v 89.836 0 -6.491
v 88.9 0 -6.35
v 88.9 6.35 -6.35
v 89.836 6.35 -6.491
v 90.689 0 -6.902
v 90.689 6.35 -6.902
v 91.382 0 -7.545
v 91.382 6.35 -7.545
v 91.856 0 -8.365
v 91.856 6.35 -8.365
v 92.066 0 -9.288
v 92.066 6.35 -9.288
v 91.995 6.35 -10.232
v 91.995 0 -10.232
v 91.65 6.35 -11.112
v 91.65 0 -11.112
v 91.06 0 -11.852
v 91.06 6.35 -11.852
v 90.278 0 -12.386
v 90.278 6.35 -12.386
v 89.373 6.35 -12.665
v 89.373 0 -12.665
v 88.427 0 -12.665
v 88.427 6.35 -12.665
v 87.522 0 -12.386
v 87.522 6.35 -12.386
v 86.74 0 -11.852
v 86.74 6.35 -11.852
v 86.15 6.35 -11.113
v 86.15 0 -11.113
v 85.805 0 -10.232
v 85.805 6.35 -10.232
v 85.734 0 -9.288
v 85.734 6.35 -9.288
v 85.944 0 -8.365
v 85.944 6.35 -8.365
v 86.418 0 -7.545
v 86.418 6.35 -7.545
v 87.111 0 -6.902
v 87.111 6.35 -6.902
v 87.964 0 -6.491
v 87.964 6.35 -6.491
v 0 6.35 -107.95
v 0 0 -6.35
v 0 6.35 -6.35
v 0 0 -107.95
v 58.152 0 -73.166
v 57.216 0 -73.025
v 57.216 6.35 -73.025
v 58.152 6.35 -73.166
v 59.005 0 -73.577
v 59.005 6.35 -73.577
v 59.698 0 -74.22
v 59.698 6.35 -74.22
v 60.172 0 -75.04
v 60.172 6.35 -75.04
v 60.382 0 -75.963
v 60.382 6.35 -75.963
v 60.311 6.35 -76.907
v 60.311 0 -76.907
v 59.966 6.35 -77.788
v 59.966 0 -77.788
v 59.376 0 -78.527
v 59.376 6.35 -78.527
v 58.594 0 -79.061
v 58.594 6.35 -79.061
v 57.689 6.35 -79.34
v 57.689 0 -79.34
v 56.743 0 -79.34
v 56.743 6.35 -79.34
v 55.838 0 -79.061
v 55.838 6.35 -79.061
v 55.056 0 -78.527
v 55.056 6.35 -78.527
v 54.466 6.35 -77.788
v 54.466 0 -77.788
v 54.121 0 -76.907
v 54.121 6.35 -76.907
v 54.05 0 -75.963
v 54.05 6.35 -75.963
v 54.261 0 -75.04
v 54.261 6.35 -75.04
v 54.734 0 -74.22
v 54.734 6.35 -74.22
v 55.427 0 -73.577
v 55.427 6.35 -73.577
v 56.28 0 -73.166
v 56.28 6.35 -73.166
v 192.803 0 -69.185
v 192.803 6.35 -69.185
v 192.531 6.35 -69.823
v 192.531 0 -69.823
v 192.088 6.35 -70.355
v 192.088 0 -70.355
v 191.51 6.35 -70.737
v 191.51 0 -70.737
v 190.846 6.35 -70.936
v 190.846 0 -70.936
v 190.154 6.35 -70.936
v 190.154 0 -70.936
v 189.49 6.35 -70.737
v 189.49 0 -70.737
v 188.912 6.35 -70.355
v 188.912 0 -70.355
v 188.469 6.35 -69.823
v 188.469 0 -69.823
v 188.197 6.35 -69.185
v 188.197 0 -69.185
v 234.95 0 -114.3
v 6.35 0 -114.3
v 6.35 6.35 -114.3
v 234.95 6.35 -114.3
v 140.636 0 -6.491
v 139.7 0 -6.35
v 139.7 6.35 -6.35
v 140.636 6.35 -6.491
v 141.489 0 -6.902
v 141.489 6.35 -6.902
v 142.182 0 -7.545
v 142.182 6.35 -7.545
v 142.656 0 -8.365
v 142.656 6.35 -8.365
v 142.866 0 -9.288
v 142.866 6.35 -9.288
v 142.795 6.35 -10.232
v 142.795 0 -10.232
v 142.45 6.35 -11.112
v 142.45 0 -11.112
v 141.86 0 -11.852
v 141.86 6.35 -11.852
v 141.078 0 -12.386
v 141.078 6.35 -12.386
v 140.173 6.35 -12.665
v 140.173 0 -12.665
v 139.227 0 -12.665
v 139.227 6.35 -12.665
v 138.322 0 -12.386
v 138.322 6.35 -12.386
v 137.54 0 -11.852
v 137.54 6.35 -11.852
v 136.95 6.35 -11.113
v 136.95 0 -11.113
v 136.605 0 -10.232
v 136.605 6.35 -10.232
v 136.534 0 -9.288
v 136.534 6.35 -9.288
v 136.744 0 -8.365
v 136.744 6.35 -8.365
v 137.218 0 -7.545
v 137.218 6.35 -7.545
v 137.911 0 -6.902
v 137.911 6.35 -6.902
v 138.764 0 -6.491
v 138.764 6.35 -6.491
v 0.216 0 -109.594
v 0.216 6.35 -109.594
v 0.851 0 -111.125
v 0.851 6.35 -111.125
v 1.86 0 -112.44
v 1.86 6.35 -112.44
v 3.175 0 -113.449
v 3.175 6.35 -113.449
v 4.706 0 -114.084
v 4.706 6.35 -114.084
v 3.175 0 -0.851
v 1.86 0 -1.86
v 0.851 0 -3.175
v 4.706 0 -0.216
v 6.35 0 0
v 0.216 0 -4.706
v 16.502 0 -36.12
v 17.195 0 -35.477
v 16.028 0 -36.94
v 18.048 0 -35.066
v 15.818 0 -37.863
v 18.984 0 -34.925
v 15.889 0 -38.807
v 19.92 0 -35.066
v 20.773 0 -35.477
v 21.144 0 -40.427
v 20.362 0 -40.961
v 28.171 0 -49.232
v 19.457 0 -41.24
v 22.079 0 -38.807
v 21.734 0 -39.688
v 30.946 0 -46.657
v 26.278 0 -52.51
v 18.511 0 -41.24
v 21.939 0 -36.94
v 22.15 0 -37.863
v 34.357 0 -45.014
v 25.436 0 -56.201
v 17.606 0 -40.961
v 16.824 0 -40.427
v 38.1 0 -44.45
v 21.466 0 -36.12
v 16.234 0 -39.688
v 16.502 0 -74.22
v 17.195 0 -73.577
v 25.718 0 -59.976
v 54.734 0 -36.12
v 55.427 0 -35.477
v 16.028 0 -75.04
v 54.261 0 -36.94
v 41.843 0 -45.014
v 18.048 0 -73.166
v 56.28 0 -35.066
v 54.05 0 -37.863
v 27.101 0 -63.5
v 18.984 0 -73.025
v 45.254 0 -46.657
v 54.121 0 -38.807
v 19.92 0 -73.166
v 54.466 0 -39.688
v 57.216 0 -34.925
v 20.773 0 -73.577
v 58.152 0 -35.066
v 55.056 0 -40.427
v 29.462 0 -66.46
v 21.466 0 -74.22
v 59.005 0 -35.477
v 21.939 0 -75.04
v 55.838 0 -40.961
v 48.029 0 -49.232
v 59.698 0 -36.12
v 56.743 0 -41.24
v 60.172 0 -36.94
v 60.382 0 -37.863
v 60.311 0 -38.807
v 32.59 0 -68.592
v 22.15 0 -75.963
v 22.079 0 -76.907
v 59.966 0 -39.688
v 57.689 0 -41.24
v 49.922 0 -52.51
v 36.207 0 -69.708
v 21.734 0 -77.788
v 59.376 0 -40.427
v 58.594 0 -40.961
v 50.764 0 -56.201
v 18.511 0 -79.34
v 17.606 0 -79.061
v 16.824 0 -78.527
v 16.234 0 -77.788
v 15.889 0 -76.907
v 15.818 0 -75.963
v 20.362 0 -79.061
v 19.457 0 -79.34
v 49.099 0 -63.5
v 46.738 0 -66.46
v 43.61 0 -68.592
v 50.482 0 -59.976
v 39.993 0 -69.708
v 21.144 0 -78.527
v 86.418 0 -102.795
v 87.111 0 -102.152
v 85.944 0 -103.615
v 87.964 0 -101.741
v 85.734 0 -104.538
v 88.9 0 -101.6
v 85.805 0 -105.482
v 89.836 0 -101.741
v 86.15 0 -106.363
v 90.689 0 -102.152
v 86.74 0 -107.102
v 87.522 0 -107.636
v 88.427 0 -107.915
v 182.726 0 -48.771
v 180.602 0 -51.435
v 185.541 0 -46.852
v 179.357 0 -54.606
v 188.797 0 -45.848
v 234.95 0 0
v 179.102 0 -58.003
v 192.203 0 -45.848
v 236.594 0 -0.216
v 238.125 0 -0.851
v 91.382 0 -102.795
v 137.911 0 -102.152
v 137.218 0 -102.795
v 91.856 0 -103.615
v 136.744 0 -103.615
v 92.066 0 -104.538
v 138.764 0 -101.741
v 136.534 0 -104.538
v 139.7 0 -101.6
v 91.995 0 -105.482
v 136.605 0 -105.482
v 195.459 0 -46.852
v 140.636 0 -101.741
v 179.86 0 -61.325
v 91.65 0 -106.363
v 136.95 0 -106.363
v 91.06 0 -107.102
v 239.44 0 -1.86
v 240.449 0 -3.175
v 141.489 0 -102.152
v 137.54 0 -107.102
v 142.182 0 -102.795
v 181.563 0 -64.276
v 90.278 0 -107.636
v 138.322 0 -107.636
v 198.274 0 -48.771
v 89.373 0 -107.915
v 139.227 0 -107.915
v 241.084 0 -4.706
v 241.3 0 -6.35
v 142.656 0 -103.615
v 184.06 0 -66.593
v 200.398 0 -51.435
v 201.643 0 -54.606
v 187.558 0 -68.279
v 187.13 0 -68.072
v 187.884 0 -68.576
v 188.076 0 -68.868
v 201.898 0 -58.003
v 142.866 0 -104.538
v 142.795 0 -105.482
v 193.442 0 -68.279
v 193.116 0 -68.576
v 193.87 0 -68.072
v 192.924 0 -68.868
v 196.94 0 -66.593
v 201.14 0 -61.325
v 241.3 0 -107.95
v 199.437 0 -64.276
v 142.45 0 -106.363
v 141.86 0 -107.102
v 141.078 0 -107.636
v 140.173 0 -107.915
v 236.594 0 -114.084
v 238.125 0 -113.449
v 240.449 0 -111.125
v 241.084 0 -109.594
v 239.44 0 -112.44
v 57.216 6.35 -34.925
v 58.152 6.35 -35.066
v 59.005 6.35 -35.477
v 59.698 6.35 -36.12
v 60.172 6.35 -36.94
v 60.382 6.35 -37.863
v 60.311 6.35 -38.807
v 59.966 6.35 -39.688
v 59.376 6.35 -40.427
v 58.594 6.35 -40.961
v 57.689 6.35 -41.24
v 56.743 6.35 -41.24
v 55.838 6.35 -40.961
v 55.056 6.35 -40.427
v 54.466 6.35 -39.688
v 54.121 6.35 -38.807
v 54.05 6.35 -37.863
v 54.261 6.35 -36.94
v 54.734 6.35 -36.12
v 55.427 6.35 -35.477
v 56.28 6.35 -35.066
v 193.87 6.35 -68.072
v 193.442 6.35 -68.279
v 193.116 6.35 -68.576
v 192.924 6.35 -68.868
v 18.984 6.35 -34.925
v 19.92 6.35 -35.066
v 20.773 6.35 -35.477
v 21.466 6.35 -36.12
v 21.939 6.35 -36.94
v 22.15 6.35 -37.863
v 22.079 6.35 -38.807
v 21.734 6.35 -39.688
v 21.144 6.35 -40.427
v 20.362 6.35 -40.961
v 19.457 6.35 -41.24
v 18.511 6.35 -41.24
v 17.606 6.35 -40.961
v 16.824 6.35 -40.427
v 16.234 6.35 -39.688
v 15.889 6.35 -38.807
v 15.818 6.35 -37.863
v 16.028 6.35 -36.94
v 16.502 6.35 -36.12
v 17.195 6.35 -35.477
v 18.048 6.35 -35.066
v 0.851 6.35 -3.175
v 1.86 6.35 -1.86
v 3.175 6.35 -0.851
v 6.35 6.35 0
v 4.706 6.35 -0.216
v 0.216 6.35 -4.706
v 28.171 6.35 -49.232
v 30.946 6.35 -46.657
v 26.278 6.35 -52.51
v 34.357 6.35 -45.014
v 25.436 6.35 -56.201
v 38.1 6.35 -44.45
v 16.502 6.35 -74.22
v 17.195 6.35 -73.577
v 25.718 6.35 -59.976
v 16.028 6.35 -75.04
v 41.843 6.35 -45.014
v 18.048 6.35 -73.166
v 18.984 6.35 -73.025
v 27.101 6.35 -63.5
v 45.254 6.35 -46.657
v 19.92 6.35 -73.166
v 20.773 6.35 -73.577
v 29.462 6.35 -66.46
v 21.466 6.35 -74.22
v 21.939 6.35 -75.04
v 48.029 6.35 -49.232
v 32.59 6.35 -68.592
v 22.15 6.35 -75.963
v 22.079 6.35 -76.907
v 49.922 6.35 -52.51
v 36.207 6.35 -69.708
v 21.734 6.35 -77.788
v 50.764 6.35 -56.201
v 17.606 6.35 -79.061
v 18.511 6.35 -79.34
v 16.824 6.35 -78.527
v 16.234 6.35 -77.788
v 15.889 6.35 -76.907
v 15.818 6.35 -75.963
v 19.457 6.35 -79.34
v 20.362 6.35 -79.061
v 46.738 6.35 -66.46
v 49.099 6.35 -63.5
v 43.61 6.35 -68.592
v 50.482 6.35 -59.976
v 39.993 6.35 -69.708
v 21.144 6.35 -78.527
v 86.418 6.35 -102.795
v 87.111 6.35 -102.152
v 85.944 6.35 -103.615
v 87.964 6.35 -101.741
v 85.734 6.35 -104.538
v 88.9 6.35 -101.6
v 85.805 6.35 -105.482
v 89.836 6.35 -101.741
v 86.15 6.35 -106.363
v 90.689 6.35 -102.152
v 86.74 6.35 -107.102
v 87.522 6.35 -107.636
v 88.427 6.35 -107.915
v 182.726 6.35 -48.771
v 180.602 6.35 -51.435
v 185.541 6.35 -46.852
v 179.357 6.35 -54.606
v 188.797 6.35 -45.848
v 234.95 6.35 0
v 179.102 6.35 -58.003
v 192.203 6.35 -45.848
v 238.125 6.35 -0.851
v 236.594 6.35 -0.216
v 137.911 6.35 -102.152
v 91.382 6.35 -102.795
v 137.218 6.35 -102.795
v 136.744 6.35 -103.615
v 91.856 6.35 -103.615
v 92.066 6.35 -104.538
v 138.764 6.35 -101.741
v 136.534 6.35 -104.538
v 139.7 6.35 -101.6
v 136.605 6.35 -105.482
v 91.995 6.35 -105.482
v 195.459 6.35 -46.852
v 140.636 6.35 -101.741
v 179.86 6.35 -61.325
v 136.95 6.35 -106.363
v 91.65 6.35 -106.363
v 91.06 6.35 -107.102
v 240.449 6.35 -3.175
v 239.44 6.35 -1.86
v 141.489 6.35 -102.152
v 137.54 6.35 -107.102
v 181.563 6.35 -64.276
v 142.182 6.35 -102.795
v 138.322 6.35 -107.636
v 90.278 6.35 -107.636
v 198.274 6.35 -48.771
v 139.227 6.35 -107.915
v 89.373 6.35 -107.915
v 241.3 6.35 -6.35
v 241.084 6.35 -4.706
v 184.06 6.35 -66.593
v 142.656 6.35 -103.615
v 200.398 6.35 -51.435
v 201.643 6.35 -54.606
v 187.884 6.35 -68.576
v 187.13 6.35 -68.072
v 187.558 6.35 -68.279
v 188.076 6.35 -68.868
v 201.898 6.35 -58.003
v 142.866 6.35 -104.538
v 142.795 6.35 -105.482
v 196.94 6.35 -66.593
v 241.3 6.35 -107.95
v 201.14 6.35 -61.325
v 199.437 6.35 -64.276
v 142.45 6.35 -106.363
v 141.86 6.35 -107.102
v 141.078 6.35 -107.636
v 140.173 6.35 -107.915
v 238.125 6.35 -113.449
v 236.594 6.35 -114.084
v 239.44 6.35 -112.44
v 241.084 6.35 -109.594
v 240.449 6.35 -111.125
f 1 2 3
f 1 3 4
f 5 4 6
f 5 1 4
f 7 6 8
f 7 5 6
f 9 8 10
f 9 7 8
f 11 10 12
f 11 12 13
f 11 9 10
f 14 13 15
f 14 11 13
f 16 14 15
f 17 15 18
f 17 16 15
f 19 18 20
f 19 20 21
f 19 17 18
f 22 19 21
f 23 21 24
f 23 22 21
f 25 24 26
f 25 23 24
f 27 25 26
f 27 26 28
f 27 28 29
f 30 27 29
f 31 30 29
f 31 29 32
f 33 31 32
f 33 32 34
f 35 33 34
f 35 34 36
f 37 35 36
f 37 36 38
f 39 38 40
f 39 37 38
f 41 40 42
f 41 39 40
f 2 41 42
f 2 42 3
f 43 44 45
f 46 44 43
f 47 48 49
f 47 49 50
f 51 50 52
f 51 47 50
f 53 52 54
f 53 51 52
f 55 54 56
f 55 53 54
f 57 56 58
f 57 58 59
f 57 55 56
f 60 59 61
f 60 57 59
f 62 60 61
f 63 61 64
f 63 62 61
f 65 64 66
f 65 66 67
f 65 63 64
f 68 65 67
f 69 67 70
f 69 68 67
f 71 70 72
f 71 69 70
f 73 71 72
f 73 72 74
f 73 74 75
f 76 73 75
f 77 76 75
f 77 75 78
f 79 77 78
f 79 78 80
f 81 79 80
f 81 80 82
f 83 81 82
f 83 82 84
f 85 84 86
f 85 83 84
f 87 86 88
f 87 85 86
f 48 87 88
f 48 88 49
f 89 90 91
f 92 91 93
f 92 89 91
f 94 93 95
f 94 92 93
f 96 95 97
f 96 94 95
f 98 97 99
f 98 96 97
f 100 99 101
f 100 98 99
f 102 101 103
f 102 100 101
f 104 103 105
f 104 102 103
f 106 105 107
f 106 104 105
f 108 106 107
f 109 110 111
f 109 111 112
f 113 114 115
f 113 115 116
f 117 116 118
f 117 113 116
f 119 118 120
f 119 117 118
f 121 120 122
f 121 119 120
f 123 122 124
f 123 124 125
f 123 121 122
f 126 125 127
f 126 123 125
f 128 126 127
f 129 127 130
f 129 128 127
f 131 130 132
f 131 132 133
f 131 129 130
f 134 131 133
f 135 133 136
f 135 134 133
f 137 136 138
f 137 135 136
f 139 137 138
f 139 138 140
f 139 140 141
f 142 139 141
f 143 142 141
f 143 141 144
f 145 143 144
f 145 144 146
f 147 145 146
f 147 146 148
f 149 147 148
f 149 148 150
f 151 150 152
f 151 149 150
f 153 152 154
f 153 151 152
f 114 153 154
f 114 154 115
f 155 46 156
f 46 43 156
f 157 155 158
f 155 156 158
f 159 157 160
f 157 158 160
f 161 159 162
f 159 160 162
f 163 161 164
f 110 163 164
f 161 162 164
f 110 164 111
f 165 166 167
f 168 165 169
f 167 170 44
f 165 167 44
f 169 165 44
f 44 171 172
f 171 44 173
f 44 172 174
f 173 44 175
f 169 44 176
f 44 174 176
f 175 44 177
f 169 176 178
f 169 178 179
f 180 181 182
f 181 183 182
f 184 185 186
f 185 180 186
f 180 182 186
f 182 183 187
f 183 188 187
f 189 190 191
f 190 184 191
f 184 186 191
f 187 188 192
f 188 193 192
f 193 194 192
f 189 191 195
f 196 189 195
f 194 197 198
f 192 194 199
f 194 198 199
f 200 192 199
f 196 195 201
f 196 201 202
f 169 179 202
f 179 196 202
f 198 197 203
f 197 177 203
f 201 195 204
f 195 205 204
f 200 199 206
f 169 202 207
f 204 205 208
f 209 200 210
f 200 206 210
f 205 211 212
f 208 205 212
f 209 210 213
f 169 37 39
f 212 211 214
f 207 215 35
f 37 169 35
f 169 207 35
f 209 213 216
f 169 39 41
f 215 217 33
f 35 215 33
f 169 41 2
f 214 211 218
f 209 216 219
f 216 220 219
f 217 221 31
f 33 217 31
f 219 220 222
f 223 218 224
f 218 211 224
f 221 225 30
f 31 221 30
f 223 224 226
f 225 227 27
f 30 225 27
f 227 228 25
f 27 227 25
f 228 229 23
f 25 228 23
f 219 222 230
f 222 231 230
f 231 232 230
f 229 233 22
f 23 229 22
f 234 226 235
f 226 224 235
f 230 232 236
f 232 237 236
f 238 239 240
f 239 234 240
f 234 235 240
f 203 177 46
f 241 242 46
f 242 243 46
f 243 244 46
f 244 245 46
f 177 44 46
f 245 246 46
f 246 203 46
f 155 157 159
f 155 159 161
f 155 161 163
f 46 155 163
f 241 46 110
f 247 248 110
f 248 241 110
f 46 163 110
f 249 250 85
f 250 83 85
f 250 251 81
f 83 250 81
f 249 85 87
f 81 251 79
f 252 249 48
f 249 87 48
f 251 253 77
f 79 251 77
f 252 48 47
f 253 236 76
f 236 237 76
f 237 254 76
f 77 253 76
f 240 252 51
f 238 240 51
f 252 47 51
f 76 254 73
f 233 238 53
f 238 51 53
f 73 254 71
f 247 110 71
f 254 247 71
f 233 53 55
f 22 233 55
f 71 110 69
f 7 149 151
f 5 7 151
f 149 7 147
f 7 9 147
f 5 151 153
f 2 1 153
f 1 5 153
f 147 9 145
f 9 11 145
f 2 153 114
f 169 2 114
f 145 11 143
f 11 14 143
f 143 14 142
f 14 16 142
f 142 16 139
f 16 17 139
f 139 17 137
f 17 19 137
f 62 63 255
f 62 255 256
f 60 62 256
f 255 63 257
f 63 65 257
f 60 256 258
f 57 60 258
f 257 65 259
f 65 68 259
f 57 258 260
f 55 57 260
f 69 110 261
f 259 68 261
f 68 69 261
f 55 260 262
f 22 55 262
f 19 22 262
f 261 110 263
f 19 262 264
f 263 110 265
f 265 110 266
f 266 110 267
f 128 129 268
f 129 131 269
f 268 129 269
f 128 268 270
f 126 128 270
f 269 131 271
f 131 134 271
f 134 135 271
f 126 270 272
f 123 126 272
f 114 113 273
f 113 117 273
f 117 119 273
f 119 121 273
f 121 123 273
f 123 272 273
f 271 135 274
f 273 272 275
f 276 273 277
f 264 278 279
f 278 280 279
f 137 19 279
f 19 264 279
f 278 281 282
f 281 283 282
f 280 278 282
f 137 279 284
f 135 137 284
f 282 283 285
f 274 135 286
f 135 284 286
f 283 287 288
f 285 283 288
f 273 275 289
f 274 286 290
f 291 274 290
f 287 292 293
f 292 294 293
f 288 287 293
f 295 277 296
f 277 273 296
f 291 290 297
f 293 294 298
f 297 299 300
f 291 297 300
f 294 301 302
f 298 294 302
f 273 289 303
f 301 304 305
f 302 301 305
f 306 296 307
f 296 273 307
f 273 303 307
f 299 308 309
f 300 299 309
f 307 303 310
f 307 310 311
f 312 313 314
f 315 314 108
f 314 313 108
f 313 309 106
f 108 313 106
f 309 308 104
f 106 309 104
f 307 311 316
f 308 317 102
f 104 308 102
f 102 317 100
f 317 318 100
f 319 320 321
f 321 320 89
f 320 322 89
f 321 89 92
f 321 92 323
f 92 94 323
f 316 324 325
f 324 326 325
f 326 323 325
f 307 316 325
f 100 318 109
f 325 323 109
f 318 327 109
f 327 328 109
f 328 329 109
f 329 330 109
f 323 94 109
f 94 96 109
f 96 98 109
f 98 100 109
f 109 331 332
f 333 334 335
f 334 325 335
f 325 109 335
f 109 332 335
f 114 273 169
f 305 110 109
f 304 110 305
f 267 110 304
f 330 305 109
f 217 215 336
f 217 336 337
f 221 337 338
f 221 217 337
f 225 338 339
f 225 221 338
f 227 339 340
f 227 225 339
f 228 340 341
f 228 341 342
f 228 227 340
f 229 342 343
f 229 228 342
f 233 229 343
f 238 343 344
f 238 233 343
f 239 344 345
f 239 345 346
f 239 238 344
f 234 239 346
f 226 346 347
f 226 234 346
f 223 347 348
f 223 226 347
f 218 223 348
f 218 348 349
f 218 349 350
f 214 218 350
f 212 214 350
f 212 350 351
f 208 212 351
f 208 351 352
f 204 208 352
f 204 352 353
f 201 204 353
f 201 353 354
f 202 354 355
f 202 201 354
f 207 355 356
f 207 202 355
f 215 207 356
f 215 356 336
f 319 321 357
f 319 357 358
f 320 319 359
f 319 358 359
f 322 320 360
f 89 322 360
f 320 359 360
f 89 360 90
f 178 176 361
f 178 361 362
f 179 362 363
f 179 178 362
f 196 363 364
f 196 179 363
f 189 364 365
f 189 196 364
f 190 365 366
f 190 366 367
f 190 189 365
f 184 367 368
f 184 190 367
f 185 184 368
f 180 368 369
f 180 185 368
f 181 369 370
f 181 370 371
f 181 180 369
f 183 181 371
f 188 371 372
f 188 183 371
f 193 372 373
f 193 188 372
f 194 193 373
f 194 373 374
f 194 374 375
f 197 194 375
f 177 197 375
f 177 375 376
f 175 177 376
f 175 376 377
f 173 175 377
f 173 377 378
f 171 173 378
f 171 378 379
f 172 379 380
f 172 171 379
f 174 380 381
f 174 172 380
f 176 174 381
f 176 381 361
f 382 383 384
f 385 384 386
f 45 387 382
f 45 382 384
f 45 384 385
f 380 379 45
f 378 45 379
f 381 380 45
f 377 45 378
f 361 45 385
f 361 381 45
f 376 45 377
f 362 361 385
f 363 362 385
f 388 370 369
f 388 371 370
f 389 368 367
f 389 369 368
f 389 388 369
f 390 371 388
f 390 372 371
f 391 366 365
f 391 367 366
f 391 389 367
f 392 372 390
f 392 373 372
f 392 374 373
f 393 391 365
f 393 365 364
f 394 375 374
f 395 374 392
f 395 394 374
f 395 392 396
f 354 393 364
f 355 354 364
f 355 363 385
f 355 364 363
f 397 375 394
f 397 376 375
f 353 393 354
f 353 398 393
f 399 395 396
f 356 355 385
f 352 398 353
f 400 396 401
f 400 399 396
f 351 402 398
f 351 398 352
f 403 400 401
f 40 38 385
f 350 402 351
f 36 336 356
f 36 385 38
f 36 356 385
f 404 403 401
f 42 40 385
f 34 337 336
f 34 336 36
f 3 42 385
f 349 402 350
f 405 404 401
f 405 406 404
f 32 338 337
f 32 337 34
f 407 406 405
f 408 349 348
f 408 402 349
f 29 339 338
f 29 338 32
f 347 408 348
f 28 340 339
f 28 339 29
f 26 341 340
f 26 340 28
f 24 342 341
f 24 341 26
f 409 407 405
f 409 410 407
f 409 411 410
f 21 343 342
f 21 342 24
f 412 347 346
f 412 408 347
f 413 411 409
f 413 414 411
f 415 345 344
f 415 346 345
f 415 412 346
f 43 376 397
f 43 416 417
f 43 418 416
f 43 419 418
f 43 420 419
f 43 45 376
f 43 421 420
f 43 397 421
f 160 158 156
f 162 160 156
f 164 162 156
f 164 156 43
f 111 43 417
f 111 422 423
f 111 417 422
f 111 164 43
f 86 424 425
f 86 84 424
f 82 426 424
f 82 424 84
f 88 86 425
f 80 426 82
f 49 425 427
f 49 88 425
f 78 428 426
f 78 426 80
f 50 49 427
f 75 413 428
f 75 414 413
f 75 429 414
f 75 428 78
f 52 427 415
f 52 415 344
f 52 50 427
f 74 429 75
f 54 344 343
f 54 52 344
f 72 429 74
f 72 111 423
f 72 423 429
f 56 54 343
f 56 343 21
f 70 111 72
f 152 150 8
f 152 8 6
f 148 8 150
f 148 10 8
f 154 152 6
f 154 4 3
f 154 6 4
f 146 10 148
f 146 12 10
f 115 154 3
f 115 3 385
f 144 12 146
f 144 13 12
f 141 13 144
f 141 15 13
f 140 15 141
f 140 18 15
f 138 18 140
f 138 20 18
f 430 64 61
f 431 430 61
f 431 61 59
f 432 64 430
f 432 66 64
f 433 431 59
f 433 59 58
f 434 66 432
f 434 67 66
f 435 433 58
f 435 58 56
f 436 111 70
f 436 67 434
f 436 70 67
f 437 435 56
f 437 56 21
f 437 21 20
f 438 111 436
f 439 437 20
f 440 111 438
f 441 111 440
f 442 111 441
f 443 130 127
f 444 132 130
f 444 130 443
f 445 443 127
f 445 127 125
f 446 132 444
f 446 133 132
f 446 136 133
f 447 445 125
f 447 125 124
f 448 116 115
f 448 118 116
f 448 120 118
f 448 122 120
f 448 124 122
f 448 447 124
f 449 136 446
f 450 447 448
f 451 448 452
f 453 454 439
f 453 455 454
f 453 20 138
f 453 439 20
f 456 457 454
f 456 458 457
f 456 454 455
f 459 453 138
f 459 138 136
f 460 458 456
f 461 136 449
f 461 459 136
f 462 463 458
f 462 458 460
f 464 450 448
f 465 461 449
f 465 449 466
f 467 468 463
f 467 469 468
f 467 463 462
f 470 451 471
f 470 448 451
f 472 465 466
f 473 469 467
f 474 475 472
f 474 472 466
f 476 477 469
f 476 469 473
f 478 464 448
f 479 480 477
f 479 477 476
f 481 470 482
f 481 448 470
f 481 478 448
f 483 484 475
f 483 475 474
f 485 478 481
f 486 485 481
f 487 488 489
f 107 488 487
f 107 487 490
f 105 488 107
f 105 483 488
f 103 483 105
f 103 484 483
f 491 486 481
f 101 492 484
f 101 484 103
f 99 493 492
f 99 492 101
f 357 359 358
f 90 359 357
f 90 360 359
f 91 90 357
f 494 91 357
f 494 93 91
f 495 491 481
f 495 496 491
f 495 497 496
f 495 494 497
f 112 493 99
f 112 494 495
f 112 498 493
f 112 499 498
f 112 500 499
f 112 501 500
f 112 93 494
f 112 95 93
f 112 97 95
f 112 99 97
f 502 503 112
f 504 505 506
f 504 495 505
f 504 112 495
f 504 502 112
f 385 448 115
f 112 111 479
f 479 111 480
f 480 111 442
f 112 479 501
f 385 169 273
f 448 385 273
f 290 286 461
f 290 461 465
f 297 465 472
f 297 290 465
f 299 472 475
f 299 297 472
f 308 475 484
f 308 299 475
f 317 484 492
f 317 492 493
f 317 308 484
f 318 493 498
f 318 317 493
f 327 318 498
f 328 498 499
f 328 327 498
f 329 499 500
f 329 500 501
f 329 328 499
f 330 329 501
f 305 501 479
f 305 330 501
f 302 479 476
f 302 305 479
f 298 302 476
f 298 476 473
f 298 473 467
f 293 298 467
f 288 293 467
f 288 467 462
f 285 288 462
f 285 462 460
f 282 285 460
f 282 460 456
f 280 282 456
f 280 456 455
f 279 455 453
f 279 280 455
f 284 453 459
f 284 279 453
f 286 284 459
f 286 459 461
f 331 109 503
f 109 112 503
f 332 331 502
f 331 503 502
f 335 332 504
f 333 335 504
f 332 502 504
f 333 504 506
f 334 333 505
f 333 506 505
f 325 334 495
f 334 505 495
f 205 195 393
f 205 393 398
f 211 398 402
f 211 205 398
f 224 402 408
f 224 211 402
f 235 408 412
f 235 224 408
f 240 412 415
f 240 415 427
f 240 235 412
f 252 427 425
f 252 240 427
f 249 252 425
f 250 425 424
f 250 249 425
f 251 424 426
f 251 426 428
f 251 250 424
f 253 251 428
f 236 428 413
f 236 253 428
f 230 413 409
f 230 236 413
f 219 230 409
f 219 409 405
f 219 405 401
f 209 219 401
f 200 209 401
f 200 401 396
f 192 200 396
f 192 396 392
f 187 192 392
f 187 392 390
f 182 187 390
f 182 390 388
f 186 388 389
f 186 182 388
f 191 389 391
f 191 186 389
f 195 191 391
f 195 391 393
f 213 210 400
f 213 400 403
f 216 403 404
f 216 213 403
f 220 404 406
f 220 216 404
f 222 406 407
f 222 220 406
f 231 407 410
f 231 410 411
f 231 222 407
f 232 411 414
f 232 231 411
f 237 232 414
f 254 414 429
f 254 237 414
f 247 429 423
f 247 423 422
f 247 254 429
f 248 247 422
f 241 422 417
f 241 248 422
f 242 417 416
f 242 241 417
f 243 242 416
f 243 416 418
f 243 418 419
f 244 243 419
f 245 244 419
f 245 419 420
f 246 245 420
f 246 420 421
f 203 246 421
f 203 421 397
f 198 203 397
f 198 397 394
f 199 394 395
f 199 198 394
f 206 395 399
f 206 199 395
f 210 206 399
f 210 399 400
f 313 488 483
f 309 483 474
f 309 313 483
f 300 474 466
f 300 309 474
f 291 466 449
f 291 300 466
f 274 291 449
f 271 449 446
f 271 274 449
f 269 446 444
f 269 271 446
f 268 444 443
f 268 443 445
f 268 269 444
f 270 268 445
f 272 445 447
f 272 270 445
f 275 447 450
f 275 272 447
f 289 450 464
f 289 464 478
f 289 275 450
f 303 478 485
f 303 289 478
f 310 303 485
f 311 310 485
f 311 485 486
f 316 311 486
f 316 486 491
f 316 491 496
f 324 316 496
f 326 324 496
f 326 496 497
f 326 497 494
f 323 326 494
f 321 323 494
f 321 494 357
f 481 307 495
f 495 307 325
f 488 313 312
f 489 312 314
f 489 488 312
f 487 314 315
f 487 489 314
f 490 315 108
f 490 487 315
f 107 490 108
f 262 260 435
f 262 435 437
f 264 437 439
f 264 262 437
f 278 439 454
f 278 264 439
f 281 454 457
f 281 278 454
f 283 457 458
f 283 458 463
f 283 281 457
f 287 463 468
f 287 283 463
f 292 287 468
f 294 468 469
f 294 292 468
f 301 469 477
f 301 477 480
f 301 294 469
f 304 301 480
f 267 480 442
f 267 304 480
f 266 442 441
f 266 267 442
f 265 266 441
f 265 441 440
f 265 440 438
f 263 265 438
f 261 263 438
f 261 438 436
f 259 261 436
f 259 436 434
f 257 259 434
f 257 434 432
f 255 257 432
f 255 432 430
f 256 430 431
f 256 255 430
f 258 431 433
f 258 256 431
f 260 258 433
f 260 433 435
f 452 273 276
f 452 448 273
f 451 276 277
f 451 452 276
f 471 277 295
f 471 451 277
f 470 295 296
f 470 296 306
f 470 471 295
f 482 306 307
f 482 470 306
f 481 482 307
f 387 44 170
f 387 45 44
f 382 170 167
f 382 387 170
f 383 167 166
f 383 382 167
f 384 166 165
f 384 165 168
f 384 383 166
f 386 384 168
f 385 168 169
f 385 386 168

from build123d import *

# Parameters (mm, degrees)
SKETCH1_W           = 241.3
SKETCH1_H           = 114.3
SKETCH1_R           = 12.7
SKETCH1_R_2         = 3.175
BOSS_EXTRUDE1_DEPTH = 6.35
FILLET1_R           = 6.35
FILLET2_R           = 1.5875


with BuildPart() as part:
    # Sketch1 → Boss-Extrude1 (new body)
    with BuildSketch(Plane(origin=(0, 0, 0), x_dir=(1, 0, 0), z_dir=(0, 1, 0))):
        with Locations((120.65, 57.15)):
            Rectangle(SKETCH1_W, SKETCH1_H)
        with Locations(Location((38.1, 57.15, 0), (0, 0, 270))):
            Circle(SKETCH1_R, mode=Mode.SUBTRACT)
        with Locations(Location((88.9, 104.775, 0), (0, 0, 270))):
            Circle(SKETCH1_R_2, mode=Mode.SUBTRACT)
        with Locations(Location((139.7, 104.775, 0), (0, 0, 270))):
            Circle(SKETCH1_R_2, mode=Mode.SUBTRACT)
        with Locations(Location((139.7, 9.525, 0), (0, 0, 270))):
            Circle(SKETCH1_R_2, mode=Mode.SUBTRACT)
        with Locations(Location((88.9, 9.525, 0), (0, 0, 270))):
            Circle(SKETCH1_R_2, mode=Mode.SUBTRACT)
        with Locations(Location((18.983968606, 76.2, 0), (0, 0, 270))):
            Circle(SKETCH1_R_2, mode=Mode.SUBTRACT)
        with Locations(Location((18.983968606, 38.1, 0), (0, 0, 270))):
            Circle(SKETCH1_R_2, mode=Mode.SUBTRACT)
        with Locations(Location((57.216031394, 38.1, 0), (0, 0, 270))):
            Circle(SKETCH1_R_2, mode=Mode.SUBTRACT)
        with Locations(Location((57.216031394, 76.2, 0), (0, 0, 270))):
            Circle(SKETCH1_R_2, mode=Mode.SUBTRACT)
        with BuildLine():
            ThreePointArc((188.131704345, 68.331953125), (190.5, 45.72), (192.868295655, 68.331953125))
            ThreePointArc((192.868295655, 68.331953125), (190.5, 70.96125), (188.131704345, 68.331953125))
        make_face(mode=Mode.SUBTRACT)
    extrude(amount=BOSS_EXTRUDE1_DEPTH)

    # Fillet1
    fillet1_edges = [part.edges().sort_by_distance(p)[0] for p in [
        (0, 3.175, -114.3),
        (241.3, 3.175, -114.3),
        (241.3, 3.175, 0),
        (0, 3.175, 0),
    ]]
    fillet(fillet1_edges, radius=FILLET1_R)

    # Fillet2
    fillet2_edges = [part.edges().sort_by_distance(p)[0] for p in [
        (192.868295655, 3.175, -68.331953125),
        (188.131704345, 3.175, -68.331953125),
    ]]
    fillet(fillet2_edges, radius=FILLET2_R)


solid = part.part
